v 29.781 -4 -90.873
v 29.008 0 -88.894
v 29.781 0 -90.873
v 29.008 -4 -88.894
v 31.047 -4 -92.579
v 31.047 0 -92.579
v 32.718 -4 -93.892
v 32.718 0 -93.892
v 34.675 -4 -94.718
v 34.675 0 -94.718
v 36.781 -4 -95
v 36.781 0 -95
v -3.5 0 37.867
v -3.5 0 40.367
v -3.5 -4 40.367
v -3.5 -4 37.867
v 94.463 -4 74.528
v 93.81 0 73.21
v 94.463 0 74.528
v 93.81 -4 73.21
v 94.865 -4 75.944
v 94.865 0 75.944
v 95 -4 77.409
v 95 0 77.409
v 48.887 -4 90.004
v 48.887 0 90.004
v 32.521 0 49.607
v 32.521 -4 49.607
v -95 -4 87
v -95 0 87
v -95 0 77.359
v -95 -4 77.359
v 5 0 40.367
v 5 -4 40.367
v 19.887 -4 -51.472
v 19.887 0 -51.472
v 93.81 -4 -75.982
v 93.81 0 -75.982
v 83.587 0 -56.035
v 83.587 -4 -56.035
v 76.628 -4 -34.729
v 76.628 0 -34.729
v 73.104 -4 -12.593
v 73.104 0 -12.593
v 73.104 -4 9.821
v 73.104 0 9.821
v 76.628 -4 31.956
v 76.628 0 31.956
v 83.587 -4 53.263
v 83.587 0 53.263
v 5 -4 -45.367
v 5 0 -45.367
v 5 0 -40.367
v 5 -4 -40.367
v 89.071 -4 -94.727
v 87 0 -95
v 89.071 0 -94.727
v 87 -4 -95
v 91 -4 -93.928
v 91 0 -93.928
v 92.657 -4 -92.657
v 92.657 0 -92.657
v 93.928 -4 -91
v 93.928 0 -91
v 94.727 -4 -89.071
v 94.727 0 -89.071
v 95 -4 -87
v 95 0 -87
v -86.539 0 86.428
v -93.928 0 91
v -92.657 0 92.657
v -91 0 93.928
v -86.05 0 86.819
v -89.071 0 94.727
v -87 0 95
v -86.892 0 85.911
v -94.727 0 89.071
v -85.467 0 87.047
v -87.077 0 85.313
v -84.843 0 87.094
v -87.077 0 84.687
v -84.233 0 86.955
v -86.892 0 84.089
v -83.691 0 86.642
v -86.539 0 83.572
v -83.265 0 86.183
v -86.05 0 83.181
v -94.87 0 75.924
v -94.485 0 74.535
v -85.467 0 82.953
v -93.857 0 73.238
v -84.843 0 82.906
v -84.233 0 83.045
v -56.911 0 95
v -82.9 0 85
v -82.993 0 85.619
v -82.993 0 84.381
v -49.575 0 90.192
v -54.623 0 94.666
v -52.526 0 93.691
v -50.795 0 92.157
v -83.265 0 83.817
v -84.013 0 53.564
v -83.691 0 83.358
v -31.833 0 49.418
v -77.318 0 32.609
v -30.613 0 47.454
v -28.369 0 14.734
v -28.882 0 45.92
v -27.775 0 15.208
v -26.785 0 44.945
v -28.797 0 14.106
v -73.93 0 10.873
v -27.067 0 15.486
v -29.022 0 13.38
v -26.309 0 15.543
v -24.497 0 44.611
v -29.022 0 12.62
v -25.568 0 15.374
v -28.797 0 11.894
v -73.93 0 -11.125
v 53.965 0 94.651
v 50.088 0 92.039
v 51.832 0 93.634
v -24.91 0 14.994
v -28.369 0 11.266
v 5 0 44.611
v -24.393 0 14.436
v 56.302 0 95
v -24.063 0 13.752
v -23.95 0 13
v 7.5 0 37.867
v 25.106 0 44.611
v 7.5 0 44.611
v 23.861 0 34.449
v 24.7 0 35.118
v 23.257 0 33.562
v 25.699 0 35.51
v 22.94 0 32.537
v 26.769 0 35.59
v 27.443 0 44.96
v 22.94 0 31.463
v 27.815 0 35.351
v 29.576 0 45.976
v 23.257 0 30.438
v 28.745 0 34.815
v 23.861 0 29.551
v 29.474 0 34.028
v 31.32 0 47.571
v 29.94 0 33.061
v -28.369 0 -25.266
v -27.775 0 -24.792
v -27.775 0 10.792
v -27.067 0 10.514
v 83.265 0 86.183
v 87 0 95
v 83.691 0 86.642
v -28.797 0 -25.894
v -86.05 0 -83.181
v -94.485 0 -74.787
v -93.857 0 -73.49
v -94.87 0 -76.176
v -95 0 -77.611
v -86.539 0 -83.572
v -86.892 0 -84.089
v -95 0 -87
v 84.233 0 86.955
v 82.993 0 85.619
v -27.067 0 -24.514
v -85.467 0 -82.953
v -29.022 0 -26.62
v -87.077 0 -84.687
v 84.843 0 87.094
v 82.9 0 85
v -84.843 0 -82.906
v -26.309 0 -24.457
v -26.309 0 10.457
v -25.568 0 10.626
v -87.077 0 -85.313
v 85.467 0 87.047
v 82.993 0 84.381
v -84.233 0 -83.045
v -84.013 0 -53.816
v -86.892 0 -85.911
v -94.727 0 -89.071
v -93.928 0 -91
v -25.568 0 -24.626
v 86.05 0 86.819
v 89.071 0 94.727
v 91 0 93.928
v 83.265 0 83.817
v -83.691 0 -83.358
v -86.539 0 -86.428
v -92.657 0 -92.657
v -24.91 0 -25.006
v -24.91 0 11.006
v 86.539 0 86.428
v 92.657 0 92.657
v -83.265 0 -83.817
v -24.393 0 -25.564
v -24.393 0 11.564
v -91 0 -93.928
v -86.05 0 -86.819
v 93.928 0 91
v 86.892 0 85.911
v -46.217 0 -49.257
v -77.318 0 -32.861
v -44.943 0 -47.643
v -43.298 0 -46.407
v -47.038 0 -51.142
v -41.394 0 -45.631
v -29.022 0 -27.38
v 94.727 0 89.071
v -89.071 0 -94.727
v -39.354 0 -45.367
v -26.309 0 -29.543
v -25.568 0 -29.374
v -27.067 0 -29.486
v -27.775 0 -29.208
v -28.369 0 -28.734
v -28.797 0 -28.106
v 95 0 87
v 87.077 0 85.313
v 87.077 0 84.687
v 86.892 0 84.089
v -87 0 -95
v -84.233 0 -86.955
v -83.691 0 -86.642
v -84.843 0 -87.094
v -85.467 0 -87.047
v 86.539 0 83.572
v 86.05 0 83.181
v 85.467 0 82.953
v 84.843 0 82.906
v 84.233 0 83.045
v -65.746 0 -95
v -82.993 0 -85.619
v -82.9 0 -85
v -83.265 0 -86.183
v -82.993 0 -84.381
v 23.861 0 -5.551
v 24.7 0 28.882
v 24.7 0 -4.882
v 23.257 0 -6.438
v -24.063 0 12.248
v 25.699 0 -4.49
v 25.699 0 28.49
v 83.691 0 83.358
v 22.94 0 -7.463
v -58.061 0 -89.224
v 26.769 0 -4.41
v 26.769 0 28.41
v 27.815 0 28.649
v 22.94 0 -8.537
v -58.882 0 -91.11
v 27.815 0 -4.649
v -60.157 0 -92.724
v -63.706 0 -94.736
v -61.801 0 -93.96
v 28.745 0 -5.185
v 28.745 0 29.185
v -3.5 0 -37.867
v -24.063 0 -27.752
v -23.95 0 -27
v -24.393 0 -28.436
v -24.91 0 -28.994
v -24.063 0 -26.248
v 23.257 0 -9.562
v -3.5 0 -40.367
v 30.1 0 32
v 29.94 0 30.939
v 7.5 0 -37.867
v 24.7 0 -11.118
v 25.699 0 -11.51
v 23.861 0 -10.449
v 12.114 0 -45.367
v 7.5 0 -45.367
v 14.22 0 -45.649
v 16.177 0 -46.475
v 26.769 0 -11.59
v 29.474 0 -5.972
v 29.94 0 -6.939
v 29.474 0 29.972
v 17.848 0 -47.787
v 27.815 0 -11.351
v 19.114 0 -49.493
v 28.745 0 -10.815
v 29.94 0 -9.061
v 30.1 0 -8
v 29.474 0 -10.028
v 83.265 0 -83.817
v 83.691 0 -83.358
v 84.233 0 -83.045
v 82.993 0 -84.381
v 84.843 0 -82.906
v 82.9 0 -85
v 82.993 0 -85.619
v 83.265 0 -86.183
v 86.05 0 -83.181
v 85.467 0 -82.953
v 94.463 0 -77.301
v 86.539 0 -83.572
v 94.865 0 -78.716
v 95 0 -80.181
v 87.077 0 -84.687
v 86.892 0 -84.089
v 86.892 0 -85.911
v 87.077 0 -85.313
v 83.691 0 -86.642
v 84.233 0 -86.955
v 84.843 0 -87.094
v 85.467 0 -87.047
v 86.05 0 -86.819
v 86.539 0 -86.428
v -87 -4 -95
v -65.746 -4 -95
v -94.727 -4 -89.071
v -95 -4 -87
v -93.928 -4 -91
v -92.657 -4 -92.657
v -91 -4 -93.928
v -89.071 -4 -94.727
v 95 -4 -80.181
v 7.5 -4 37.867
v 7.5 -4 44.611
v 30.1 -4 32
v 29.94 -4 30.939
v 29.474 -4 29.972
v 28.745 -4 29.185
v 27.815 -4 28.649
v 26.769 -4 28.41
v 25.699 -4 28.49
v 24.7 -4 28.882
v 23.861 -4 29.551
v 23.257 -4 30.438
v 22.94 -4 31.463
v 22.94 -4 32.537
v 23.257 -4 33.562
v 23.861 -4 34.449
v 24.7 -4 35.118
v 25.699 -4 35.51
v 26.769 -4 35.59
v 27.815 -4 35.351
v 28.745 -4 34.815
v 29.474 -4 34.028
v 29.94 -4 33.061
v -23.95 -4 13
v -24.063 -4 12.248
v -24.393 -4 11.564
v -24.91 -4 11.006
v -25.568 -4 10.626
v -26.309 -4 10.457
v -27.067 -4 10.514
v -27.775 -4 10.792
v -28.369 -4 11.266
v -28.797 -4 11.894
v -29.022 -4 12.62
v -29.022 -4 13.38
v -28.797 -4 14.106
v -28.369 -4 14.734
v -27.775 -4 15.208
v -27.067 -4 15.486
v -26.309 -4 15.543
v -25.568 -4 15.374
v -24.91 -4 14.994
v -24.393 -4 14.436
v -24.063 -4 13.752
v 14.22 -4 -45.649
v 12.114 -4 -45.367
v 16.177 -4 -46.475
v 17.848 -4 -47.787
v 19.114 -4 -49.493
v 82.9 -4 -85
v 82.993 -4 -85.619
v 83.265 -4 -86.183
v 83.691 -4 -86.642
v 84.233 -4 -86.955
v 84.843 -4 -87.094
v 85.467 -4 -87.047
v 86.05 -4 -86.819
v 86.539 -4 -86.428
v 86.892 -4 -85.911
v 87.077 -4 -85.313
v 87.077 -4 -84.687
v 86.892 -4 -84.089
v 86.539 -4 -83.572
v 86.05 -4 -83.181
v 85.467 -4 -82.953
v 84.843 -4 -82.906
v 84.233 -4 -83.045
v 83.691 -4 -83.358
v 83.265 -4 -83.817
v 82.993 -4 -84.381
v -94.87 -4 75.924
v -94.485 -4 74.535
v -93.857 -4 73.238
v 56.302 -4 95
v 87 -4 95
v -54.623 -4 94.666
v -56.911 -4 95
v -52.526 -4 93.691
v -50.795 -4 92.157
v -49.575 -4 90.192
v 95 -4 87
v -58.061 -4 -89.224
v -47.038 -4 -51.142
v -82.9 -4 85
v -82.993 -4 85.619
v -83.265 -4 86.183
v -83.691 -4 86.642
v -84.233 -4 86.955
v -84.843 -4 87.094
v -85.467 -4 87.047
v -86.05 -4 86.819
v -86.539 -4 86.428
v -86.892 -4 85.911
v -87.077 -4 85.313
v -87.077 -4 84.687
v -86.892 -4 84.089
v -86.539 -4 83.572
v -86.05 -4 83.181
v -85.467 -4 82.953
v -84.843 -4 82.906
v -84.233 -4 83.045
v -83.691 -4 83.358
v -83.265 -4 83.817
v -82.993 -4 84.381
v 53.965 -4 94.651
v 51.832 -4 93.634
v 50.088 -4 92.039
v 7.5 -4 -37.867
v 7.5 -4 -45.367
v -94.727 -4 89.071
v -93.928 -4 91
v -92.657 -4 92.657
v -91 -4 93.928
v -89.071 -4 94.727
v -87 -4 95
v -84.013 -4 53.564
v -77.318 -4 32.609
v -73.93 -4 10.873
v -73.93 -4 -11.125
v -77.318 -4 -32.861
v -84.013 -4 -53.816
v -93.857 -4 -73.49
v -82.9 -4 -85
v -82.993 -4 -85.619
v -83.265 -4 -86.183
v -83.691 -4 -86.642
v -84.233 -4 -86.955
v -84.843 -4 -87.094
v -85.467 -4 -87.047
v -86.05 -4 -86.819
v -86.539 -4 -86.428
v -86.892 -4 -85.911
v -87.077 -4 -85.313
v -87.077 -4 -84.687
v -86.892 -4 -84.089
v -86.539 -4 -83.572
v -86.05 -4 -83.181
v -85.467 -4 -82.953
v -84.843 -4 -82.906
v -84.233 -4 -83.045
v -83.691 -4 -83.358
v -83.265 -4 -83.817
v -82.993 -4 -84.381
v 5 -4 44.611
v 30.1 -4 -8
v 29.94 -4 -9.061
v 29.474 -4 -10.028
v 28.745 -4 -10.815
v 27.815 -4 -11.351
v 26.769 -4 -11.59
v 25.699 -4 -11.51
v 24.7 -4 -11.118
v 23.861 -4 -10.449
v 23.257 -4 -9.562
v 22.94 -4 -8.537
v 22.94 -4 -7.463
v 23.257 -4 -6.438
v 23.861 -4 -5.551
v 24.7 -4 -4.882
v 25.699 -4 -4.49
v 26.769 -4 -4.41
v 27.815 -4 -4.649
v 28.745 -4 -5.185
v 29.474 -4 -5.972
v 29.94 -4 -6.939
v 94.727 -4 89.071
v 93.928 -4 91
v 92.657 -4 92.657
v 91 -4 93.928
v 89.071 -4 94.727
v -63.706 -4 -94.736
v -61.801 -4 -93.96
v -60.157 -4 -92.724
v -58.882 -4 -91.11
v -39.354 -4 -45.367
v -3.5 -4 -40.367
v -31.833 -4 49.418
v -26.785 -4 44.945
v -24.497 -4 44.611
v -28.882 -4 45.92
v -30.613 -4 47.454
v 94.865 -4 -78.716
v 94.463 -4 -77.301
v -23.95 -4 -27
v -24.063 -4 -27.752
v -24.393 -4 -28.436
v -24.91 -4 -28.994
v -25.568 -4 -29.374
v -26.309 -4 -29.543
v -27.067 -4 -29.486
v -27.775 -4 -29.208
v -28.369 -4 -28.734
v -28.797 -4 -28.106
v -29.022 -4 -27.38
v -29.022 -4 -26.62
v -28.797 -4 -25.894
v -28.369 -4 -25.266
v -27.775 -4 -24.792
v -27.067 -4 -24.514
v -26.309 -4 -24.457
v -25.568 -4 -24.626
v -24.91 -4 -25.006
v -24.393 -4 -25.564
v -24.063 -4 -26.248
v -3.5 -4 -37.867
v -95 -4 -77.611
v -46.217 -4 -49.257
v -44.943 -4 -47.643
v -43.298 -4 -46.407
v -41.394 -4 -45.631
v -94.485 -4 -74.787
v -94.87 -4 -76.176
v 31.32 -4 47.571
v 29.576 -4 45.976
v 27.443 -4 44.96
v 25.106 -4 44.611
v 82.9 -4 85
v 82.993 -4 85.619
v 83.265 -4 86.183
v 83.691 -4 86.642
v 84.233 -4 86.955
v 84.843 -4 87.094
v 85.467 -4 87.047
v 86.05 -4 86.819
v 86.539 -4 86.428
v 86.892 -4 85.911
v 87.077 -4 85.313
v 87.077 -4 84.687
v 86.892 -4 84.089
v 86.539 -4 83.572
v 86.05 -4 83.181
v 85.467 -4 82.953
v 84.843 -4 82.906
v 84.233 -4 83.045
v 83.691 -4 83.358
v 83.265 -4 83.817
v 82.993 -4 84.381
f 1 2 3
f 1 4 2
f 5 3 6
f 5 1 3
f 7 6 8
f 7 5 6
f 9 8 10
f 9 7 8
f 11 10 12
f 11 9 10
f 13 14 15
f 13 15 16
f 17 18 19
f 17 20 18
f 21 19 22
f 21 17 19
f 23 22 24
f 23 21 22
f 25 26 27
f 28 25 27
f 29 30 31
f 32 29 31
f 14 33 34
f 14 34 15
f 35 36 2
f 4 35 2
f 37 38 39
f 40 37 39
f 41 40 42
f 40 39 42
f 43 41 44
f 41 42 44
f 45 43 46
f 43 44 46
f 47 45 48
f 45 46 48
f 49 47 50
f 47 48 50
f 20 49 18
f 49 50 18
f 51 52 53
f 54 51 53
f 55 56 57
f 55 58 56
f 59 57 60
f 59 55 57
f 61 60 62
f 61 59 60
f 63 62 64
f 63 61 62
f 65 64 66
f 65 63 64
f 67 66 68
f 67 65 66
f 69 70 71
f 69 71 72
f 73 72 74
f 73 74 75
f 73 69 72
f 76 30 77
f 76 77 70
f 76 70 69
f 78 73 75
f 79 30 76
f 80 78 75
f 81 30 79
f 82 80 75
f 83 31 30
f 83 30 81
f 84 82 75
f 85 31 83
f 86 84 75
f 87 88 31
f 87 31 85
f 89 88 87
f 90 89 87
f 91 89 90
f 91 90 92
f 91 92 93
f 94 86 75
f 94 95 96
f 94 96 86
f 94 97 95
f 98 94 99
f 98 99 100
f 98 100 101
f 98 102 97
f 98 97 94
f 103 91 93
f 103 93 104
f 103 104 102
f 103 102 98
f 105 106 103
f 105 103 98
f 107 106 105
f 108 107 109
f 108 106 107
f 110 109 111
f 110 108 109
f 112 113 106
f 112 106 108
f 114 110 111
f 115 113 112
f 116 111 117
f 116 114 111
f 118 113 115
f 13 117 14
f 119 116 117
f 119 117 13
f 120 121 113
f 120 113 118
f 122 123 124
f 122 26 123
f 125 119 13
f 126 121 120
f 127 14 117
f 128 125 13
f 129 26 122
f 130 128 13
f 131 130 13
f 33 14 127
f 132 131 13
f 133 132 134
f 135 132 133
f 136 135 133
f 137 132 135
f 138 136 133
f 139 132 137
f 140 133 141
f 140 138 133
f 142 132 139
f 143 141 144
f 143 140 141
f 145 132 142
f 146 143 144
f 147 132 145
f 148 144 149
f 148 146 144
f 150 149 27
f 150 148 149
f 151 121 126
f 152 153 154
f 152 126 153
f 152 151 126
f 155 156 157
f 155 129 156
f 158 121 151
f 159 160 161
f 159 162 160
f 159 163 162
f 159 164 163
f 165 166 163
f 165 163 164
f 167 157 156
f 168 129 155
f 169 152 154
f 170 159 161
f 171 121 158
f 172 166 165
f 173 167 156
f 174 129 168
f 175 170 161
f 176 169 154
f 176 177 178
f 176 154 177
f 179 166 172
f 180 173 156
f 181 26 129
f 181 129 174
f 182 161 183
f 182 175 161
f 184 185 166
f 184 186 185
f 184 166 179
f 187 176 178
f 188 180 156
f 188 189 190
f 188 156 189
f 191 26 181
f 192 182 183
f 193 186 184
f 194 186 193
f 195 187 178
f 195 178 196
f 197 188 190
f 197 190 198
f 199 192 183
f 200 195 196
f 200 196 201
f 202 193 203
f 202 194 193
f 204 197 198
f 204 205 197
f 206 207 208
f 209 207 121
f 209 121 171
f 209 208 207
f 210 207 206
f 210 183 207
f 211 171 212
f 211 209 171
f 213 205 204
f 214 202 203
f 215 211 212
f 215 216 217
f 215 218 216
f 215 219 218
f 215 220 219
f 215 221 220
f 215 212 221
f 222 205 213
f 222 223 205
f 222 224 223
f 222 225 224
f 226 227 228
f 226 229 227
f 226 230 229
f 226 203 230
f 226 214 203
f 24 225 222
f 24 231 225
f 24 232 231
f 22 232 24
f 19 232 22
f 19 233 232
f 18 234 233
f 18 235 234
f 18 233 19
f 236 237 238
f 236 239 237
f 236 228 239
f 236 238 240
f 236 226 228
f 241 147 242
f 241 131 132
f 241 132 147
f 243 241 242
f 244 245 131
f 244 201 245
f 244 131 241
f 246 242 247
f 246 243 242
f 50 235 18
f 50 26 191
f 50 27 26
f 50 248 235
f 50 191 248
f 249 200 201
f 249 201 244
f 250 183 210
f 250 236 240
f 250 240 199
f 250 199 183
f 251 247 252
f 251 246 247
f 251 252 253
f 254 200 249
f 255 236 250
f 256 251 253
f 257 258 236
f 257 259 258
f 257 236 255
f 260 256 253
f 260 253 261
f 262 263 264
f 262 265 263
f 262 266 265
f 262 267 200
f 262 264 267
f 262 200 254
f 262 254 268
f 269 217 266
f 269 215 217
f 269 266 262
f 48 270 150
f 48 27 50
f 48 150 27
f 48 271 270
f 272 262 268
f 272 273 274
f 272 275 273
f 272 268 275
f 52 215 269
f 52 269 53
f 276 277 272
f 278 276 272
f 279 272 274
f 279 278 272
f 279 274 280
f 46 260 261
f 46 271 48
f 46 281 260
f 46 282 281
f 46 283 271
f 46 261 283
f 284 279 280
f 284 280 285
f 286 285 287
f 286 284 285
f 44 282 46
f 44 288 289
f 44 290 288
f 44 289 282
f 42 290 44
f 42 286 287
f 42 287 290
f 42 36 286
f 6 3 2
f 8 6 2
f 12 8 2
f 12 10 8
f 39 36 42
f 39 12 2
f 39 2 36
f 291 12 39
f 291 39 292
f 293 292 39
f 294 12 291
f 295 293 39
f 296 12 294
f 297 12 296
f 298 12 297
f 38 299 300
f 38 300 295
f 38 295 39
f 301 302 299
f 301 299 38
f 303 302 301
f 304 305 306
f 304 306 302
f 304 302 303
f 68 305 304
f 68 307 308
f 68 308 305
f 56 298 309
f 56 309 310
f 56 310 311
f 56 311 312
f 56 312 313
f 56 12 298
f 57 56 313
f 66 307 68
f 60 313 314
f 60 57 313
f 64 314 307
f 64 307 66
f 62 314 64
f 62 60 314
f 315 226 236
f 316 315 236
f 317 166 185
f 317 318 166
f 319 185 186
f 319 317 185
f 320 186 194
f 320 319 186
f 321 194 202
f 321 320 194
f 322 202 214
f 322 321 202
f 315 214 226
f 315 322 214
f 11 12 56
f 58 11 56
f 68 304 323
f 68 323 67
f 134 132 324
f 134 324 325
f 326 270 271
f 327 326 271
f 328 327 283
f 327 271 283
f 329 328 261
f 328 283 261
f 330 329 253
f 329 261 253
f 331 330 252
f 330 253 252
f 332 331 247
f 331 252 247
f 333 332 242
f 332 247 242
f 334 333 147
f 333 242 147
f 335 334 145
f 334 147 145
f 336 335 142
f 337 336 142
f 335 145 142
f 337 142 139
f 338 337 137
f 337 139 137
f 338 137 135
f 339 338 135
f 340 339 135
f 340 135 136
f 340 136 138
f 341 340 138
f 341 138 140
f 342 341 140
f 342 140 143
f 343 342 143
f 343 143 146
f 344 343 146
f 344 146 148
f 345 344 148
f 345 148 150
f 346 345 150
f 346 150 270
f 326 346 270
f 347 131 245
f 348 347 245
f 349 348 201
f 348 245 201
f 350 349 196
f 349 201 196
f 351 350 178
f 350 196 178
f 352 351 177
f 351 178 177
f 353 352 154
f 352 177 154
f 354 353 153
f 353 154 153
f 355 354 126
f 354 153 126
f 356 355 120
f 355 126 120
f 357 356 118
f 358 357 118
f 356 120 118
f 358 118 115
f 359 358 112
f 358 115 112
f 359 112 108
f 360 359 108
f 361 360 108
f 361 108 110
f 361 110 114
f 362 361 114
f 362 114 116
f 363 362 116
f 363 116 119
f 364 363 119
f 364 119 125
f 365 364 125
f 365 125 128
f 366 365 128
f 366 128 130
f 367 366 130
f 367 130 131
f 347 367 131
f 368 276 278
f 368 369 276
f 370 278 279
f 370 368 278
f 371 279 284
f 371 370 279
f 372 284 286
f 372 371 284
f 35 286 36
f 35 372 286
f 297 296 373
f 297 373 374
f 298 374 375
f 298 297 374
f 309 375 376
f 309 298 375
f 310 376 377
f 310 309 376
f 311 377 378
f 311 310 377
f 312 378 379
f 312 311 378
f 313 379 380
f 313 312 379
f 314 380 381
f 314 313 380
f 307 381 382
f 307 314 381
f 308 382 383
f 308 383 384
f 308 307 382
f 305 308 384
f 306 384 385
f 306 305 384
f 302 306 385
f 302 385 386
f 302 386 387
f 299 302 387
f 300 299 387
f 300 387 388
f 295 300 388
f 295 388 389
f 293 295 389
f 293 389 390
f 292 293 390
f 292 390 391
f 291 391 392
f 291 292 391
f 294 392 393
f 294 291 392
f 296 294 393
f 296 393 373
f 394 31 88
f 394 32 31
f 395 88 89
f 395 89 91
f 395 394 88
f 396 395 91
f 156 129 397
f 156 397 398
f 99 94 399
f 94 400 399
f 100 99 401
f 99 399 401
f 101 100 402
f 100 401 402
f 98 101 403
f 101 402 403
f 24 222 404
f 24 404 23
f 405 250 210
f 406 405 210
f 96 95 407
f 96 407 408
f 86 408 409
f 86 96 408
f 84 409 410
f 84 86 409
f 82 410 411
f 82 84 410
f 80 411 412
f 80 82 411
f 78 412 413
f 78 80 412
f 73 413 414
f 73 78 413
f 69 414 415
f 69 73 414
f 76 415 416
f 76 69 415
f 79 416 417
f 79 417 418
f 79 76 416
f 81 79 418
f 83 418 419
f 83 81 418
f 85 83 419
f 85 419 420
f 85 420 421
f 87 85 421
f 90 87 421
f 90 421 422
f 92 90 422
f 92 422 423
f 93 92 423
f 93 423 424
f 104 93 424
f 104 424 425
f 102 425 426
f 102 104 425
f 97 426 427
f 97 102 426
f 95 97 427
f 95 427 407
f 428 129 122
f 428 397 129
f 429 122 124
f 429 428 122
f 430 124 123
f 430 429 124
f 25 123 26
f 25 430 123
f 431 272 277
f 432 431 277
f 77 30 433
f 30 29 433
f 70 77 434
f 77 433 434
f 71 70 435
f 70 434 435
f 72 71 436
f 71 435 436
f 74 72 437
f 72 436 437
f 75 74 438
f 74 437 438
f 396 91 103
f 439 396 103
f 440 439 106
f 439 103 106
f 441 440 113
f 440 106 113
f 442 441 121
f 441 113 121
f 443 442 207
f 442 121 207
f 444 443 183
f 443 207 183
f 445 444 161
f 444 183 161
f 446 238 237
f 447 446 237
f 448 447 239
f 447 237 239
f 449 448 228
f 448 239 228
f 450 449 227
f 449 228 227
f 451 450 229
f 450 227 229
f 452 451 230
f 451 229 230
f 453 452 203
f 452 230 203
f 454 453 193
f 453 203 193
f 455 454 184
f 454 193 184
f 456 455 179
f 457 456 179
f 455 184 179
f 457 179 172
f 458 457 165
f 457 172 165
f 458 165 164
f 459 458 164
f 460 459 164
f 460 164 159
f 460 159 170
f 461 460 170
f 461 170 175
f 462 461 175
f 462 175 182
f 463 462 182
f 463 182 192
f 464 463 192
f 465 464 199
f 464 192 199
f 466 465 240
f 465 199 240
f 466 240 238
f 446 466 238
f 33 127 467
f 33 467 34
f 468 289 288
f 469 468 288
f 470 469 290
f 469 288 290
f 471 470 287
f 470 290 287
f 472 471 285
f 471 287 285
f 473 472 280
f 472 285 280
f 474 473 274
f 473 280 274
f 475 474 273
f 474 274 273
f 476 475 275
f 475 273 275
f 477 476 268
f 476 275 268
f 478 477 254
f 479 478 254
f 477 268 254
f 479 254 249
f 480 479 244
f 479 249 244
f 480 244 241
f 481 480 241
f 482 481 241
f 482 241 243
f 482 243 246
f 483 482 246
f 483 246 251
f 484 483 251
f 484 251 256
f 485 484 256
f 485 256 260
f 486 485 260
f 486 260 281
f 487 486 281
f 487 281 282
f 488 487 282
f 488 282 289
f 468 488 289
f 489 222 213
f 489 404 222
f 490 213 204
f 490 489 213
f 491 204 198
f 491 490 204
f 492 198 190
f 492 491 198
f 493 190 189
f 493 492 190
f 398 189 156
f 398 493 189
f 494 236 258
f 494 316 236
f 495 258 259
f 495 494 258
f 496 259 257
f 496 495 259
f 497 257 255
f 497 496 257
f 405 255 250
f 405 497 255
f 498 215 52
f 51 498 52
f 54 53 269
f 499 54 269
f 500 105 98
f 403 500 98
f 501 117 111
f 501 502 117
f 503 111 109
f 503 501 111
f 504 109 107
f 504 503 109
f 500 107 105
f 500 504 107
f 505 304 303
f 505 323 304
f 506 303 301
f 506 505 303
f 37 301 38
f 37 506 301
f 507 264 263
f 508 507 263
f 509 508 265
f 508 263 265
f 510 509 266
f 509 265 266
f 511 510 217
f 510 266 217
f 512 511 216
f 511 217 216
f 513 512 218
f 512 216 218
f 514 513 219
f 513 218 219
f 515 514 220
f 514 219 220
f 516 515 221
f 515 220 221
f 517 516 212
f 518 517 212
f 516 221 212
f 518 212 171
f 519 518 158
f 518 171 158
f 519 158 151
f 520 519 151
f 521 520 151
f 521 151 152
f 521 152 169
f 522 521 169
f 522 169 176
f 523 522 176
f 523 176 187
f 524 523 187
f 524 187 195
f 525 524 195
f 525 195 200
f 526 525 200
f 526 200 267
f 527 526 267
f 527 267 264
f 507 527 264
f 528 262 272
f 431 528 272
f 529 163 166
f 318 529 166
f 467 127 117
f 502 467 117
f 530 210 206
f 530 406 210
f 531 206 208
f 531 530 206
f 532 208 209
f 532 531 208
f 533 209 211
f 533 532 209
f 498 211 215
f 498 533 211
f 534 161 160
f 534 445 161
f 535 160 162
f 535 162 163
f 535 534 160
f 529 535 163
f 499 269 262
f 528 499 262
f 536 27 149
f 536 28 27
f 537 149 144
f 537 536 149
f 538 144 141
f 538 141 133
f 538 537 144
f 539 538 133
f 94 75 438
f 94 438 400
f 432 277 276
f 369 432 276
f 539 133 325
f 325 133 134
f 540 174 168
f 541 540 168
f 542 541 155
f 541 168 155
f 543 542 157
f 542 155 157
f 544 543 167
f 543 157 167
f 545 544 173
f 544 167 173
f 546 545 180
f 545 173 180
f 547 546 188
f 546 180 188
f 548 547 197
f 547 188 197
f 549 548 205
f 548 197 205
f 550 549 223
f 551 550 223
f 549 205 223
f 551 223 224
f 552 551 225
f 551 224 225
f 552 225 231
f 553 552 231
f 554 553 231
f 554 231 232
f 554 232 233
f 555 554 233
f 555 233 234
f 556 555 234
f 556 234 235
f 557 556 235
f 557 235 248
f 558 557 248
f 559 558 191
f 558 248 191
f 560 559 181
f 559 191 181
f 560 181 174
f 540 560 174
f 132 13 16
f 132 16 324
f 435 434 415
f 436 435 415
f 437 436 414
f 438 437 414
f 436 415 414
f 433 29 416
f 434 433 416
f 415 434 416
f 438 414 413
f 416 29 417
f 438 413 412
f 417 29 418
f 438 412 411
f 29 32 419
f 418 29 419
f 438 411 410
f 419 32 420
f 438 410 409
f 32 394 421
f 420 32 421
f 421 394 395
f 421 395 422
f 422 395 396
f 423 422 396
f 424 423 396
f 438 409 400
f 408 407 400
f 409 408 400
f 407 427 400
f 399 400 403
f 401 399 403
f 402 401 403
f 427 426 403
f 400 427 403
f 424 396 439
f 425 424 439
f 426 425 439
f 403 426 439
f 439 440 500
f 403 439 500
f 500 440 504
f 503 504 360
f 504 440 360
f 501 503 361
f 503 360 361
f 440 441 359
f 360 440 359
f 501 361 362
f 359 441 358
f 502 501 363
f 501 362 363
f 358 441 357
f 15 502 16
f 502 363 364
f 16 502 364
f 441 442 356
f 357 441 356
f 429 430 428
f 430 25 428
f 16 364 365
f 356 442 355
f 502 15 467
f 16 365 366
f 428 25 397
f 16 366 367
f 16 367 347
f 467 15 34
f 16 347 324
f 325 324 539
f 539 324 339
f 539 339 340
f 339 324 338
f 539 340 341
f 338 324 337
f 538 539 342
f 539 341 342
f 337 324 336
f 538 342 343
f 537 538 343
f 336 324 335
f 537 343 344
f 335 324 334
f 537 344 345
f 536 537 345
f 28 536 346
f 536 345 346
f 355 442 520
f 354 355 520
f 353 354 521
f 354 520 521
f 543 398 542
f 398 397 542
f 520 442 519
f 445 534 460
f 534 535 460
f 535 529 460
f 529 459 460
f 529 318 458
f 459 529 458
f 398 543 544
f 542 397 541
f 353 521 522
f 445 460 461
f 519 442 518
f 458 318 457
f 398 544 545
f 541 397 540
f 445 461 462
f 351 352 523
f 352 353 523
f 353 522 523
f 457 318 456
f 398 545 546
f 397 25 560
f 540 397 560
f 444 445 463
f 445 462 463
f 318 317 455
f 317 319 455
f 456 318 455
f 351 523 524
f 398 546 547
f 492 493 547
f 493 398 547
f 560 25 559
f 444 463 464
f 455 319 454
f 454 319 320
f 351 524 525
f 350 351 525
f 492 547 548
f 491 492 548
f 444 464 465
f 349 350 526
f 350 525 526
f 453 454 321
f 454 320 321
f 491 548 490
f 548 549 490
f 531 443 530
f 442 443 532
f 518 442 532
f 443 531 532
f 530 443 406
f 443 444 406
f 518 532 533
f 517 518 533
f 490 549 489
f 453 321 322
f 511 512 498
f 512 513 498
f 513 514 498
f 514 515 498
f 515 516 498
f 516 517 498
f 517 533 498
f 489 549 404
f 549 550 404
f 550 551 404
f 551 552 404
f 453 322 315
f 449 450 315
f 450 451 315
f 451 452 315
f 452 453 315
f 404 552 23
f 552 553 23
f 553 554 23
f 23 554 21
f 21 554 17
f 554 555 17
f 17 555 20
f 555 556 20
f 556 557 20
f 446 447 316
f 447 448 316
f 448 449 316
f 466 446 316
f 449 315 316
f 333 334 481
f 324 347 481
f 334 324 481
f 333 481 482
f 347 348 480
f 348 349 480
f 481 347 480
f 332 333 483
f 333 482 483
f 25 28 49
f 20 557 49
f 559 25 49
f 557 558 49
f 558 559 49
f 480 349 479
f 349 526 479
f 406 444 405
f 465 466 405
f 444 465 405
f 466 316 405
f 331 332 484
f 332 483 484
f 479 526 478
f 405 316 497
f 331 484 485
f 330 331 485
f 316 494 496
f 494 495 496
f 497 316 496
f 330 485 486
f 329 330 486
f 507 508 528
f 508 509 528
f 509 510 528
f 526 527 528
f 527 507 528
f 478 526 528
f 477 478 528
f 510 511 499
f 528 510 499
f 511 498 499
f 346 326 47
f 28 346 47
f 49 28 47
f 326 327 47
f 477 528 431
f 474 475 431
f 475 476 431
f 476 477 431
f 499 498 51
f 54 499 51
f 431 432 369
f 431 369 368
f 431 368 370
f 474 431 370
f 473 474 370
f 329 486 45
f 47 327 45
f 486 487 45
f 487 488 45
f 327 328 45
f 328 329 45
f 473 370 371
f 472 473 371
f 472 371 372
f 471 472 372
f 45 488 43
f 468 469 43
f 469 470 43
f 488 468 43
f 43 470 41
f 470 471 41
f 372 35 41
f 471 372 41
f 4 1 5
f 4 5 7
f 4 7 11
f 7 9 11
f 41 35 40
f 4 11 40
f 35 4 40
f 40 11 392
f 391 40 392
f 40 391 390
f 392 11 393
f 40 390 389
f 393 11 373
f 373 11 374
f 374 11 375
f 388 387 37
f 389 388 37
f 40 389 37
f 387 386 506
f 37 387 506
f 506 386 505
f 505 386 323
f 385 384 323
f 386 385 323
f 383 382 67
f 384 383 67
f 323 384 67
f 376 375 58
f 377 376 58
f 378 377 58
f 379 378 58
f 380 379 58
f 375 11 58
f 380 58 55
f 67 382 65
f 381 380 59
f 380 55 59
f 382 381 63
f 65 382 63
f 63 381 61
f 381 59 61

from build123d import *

# Parameters (mm, degrees)
SKETCH1_W               = 190
SKETCH1_H               = 190
BASE_DEPTH              = 4
SKETCH1_5_R             = 2.1
CUT_EXTRUDE2_DEPTH      = 4
MIRROR2_COPY_1_SKETCH_R = 2.1
MIRROR2_COPY_1_DEPTH    = 4
SKETCH2_R               = 2.55
SKETCH2_R_2             = 3.6
HOLES_DEPTH             = 135.40982107
CUT_EXTRUDE4_DEPTH      = 4
CUT_EXTRUDE5_DEPTH      = 4
CUT_EXTRUDE6_DEPTH      = 4
FILLET1_R               = 8
CUT_EXTRUDE7_DEPTH      = 4


with BuildPart() as part:
    # Sketch1 → base (new body)
    with BuildSketch(Plane(origin=(0, 0, 0), x_dir=(1, 0, 0), z_dir=(0, 1, 0))):
        Rectangle(SKETCH1_W, SKETCH1_H)
    extrude(amount=-BASE_DEPTH)

    # Sketch1<5> → Cut-Extrude2 (cut)
    with BuildSketch(Plane(origin=(0, 0, 0), x_dir=(1, 0, 0), z_dir=(0, 1, 0))):
        with Locations((-85, 85)):
            Circle(SKETCH1_5_R)
    cut_extrude2 = extrude(amount=-CUT_EXTRUDE2_DEPTH, mode=Mode.SUBTRACT)

    # Mirror1: Cut-Extrude2 across plane
    add(cut_extrude2.mirror(Plane(origin=(0, 0, 0), x_dir=(0, 0, 1), z_dir=(1, 0, 0))), mode=Mode.SUBTRACT)

    # Mirror2: Cut-Extrude2 across plane
    add(cut_extrude2.mirror(Plane.XY), mode=Mode.SUBTRACT)

    # Mirror2 copy 1 sketch → Mirror2 copy 1 (cut)
    with BuildSketch(Plane(origin=(0, 0, 0), x_dir=(-1, 0, 0), z_dir=(0, 1, 0))):
        with Locations((-85, 85)):
            Circle(MIRROR2_COPY_1_SKETCH_R)
    extrude(amount=-MIRROR2_COPY_1_DEPTH, mode=Mode.SUBTRACT)

    # Sketch2 → holes (cut, through all)
    with BuildSketch(Plane(origin=(0, 0, 0), x_dir=(1, 0, 0), z_dir=(0, 1, 0))):
        with Locations((-26.5, 27)):
            Circle(SKETCH2_R)
        with Locations((-26.5, -13)):
            Circle(SKETCH2_R)
        with Locations((26.5, -32)):
            Circle(SKETCH2_R_2)
        with Locations((26.5, 8)):
            Circle(SKETCH2_R_2)
    extrude(amount=-HOLES_DEPTH, mode=Mode.SUBTRACT)

    # Sketch3 → Cut-Extrude4 (cut)
    with BuildSketch(Plane(origin=(0, 0, 0), x_dir=(1, 0, 0), z_dir=(0, 1, 0))):
        Polygon((-45.366645318, 45.366645318), (18.398695046, 45.366645318), (30.496467131, 95), (-59.732749669, 95), align=None)
        Polygon((-51.667568279, -95), (50.911457524, -95), (30.496467131, -44.610534563), (-29.740356375, -44.610534563), align=None)
    extrude(amount=-CUT_EXTRUDE4_DEPTH, mode=Mode.SUBTRACT)

    # Sketch5 → Cut-Extrude5 (cut)
    with BuildSketch(Plane(origin=(0, 0, 0), x_dir=(1, 0, 0), z_dir=(0, 1, 0))):
        with BuildLine():
            Line((-95, 75.359038612), (-95, -75.107001693))
            ThreePointArc((-95, -75.107001693), (-73.504234295, 0.126018459), (-95, 75.359038612))
        make_face()
    extrude(amount=-CUT_EXTRUDE5_DEPTH, mode=Mode.SUBTRACT)

    # Sketch5<3> → Cut-Extrude6 (cut)
    with BuildSketch(Plane(origin=(0, 0, 0), x_dir=(1, 0, 0), z_dir=(0, 1, 0))):
        with BuildLine():
            Line((-95, 75.359038612), (-95, -75.107001693))
            ThreePointArc((-95, -75.107001693), (-73.504234295, 0.126018459), (-95, 75.359038612))
        make_face()
        with BuildLine():
            Line((95, -75.107001693), (95, 77.879407796))
            ThreePointArc((95, 77.879407796), (72.661894517, 1.386203051), (95, -75.107001693))
        make_face()
    extrude(amount=-CUT_EXTRUDE6_DEPTH, mode=Mode.SUBTRACT)

    # Fillet1
    fillet1_edges = [part.edges().sort_by_distance(p)[0] for p in [
        (-95, -2, 75.107001693),
        (-95, -2, 95),
        (-51.667568279, -2, 95),
        (-29.740356375, -2, 44.610534563),
        (30.496467131, -2, 44.610534563),
        (50.911457524, -2, 95),
        (95, -2, 95),
        (95, -2, 75.107001693),
        (95, -2, -77.879407796),
        (95, -2, -95),
        (30.496467131, -2, -95),
        (18.398695046, -2, -45.366645318),
        (-45.366645318, -2, -45.366645318),
        (-59.732749669, -2, -95),
        (-95, -2, -75.359038612),
        (-95, -2, -95),
    ]]
    fillet(fillet1_edges, radius=FILLET1_R)

    # Sketch7 → Cut-Extrude7 (cut)
    with BuildSketch(Plane(origin=(0, 0, 0), x_dir=(1, 0, 0), z_dir=(0, 1, 0))):
        Polygon((5, 45.366645318), (5, 40.366645318), (-3.5, 40.366645318), (-3.5, 37.866645318), (7.5, 37.866645318), (7.5, 45.366645318), align=None)
    cut_extrude7 = extrude(amount=-CUT_EXTRUDE7_DEPTH, mode=Mode.SUBTRACT)

    # Mirror3: Cut-Extrude7 across plane
    add(cut_extrude7.mirror(Plane.XY), mode=Mode.SUBTRACT)


solid = part.part
